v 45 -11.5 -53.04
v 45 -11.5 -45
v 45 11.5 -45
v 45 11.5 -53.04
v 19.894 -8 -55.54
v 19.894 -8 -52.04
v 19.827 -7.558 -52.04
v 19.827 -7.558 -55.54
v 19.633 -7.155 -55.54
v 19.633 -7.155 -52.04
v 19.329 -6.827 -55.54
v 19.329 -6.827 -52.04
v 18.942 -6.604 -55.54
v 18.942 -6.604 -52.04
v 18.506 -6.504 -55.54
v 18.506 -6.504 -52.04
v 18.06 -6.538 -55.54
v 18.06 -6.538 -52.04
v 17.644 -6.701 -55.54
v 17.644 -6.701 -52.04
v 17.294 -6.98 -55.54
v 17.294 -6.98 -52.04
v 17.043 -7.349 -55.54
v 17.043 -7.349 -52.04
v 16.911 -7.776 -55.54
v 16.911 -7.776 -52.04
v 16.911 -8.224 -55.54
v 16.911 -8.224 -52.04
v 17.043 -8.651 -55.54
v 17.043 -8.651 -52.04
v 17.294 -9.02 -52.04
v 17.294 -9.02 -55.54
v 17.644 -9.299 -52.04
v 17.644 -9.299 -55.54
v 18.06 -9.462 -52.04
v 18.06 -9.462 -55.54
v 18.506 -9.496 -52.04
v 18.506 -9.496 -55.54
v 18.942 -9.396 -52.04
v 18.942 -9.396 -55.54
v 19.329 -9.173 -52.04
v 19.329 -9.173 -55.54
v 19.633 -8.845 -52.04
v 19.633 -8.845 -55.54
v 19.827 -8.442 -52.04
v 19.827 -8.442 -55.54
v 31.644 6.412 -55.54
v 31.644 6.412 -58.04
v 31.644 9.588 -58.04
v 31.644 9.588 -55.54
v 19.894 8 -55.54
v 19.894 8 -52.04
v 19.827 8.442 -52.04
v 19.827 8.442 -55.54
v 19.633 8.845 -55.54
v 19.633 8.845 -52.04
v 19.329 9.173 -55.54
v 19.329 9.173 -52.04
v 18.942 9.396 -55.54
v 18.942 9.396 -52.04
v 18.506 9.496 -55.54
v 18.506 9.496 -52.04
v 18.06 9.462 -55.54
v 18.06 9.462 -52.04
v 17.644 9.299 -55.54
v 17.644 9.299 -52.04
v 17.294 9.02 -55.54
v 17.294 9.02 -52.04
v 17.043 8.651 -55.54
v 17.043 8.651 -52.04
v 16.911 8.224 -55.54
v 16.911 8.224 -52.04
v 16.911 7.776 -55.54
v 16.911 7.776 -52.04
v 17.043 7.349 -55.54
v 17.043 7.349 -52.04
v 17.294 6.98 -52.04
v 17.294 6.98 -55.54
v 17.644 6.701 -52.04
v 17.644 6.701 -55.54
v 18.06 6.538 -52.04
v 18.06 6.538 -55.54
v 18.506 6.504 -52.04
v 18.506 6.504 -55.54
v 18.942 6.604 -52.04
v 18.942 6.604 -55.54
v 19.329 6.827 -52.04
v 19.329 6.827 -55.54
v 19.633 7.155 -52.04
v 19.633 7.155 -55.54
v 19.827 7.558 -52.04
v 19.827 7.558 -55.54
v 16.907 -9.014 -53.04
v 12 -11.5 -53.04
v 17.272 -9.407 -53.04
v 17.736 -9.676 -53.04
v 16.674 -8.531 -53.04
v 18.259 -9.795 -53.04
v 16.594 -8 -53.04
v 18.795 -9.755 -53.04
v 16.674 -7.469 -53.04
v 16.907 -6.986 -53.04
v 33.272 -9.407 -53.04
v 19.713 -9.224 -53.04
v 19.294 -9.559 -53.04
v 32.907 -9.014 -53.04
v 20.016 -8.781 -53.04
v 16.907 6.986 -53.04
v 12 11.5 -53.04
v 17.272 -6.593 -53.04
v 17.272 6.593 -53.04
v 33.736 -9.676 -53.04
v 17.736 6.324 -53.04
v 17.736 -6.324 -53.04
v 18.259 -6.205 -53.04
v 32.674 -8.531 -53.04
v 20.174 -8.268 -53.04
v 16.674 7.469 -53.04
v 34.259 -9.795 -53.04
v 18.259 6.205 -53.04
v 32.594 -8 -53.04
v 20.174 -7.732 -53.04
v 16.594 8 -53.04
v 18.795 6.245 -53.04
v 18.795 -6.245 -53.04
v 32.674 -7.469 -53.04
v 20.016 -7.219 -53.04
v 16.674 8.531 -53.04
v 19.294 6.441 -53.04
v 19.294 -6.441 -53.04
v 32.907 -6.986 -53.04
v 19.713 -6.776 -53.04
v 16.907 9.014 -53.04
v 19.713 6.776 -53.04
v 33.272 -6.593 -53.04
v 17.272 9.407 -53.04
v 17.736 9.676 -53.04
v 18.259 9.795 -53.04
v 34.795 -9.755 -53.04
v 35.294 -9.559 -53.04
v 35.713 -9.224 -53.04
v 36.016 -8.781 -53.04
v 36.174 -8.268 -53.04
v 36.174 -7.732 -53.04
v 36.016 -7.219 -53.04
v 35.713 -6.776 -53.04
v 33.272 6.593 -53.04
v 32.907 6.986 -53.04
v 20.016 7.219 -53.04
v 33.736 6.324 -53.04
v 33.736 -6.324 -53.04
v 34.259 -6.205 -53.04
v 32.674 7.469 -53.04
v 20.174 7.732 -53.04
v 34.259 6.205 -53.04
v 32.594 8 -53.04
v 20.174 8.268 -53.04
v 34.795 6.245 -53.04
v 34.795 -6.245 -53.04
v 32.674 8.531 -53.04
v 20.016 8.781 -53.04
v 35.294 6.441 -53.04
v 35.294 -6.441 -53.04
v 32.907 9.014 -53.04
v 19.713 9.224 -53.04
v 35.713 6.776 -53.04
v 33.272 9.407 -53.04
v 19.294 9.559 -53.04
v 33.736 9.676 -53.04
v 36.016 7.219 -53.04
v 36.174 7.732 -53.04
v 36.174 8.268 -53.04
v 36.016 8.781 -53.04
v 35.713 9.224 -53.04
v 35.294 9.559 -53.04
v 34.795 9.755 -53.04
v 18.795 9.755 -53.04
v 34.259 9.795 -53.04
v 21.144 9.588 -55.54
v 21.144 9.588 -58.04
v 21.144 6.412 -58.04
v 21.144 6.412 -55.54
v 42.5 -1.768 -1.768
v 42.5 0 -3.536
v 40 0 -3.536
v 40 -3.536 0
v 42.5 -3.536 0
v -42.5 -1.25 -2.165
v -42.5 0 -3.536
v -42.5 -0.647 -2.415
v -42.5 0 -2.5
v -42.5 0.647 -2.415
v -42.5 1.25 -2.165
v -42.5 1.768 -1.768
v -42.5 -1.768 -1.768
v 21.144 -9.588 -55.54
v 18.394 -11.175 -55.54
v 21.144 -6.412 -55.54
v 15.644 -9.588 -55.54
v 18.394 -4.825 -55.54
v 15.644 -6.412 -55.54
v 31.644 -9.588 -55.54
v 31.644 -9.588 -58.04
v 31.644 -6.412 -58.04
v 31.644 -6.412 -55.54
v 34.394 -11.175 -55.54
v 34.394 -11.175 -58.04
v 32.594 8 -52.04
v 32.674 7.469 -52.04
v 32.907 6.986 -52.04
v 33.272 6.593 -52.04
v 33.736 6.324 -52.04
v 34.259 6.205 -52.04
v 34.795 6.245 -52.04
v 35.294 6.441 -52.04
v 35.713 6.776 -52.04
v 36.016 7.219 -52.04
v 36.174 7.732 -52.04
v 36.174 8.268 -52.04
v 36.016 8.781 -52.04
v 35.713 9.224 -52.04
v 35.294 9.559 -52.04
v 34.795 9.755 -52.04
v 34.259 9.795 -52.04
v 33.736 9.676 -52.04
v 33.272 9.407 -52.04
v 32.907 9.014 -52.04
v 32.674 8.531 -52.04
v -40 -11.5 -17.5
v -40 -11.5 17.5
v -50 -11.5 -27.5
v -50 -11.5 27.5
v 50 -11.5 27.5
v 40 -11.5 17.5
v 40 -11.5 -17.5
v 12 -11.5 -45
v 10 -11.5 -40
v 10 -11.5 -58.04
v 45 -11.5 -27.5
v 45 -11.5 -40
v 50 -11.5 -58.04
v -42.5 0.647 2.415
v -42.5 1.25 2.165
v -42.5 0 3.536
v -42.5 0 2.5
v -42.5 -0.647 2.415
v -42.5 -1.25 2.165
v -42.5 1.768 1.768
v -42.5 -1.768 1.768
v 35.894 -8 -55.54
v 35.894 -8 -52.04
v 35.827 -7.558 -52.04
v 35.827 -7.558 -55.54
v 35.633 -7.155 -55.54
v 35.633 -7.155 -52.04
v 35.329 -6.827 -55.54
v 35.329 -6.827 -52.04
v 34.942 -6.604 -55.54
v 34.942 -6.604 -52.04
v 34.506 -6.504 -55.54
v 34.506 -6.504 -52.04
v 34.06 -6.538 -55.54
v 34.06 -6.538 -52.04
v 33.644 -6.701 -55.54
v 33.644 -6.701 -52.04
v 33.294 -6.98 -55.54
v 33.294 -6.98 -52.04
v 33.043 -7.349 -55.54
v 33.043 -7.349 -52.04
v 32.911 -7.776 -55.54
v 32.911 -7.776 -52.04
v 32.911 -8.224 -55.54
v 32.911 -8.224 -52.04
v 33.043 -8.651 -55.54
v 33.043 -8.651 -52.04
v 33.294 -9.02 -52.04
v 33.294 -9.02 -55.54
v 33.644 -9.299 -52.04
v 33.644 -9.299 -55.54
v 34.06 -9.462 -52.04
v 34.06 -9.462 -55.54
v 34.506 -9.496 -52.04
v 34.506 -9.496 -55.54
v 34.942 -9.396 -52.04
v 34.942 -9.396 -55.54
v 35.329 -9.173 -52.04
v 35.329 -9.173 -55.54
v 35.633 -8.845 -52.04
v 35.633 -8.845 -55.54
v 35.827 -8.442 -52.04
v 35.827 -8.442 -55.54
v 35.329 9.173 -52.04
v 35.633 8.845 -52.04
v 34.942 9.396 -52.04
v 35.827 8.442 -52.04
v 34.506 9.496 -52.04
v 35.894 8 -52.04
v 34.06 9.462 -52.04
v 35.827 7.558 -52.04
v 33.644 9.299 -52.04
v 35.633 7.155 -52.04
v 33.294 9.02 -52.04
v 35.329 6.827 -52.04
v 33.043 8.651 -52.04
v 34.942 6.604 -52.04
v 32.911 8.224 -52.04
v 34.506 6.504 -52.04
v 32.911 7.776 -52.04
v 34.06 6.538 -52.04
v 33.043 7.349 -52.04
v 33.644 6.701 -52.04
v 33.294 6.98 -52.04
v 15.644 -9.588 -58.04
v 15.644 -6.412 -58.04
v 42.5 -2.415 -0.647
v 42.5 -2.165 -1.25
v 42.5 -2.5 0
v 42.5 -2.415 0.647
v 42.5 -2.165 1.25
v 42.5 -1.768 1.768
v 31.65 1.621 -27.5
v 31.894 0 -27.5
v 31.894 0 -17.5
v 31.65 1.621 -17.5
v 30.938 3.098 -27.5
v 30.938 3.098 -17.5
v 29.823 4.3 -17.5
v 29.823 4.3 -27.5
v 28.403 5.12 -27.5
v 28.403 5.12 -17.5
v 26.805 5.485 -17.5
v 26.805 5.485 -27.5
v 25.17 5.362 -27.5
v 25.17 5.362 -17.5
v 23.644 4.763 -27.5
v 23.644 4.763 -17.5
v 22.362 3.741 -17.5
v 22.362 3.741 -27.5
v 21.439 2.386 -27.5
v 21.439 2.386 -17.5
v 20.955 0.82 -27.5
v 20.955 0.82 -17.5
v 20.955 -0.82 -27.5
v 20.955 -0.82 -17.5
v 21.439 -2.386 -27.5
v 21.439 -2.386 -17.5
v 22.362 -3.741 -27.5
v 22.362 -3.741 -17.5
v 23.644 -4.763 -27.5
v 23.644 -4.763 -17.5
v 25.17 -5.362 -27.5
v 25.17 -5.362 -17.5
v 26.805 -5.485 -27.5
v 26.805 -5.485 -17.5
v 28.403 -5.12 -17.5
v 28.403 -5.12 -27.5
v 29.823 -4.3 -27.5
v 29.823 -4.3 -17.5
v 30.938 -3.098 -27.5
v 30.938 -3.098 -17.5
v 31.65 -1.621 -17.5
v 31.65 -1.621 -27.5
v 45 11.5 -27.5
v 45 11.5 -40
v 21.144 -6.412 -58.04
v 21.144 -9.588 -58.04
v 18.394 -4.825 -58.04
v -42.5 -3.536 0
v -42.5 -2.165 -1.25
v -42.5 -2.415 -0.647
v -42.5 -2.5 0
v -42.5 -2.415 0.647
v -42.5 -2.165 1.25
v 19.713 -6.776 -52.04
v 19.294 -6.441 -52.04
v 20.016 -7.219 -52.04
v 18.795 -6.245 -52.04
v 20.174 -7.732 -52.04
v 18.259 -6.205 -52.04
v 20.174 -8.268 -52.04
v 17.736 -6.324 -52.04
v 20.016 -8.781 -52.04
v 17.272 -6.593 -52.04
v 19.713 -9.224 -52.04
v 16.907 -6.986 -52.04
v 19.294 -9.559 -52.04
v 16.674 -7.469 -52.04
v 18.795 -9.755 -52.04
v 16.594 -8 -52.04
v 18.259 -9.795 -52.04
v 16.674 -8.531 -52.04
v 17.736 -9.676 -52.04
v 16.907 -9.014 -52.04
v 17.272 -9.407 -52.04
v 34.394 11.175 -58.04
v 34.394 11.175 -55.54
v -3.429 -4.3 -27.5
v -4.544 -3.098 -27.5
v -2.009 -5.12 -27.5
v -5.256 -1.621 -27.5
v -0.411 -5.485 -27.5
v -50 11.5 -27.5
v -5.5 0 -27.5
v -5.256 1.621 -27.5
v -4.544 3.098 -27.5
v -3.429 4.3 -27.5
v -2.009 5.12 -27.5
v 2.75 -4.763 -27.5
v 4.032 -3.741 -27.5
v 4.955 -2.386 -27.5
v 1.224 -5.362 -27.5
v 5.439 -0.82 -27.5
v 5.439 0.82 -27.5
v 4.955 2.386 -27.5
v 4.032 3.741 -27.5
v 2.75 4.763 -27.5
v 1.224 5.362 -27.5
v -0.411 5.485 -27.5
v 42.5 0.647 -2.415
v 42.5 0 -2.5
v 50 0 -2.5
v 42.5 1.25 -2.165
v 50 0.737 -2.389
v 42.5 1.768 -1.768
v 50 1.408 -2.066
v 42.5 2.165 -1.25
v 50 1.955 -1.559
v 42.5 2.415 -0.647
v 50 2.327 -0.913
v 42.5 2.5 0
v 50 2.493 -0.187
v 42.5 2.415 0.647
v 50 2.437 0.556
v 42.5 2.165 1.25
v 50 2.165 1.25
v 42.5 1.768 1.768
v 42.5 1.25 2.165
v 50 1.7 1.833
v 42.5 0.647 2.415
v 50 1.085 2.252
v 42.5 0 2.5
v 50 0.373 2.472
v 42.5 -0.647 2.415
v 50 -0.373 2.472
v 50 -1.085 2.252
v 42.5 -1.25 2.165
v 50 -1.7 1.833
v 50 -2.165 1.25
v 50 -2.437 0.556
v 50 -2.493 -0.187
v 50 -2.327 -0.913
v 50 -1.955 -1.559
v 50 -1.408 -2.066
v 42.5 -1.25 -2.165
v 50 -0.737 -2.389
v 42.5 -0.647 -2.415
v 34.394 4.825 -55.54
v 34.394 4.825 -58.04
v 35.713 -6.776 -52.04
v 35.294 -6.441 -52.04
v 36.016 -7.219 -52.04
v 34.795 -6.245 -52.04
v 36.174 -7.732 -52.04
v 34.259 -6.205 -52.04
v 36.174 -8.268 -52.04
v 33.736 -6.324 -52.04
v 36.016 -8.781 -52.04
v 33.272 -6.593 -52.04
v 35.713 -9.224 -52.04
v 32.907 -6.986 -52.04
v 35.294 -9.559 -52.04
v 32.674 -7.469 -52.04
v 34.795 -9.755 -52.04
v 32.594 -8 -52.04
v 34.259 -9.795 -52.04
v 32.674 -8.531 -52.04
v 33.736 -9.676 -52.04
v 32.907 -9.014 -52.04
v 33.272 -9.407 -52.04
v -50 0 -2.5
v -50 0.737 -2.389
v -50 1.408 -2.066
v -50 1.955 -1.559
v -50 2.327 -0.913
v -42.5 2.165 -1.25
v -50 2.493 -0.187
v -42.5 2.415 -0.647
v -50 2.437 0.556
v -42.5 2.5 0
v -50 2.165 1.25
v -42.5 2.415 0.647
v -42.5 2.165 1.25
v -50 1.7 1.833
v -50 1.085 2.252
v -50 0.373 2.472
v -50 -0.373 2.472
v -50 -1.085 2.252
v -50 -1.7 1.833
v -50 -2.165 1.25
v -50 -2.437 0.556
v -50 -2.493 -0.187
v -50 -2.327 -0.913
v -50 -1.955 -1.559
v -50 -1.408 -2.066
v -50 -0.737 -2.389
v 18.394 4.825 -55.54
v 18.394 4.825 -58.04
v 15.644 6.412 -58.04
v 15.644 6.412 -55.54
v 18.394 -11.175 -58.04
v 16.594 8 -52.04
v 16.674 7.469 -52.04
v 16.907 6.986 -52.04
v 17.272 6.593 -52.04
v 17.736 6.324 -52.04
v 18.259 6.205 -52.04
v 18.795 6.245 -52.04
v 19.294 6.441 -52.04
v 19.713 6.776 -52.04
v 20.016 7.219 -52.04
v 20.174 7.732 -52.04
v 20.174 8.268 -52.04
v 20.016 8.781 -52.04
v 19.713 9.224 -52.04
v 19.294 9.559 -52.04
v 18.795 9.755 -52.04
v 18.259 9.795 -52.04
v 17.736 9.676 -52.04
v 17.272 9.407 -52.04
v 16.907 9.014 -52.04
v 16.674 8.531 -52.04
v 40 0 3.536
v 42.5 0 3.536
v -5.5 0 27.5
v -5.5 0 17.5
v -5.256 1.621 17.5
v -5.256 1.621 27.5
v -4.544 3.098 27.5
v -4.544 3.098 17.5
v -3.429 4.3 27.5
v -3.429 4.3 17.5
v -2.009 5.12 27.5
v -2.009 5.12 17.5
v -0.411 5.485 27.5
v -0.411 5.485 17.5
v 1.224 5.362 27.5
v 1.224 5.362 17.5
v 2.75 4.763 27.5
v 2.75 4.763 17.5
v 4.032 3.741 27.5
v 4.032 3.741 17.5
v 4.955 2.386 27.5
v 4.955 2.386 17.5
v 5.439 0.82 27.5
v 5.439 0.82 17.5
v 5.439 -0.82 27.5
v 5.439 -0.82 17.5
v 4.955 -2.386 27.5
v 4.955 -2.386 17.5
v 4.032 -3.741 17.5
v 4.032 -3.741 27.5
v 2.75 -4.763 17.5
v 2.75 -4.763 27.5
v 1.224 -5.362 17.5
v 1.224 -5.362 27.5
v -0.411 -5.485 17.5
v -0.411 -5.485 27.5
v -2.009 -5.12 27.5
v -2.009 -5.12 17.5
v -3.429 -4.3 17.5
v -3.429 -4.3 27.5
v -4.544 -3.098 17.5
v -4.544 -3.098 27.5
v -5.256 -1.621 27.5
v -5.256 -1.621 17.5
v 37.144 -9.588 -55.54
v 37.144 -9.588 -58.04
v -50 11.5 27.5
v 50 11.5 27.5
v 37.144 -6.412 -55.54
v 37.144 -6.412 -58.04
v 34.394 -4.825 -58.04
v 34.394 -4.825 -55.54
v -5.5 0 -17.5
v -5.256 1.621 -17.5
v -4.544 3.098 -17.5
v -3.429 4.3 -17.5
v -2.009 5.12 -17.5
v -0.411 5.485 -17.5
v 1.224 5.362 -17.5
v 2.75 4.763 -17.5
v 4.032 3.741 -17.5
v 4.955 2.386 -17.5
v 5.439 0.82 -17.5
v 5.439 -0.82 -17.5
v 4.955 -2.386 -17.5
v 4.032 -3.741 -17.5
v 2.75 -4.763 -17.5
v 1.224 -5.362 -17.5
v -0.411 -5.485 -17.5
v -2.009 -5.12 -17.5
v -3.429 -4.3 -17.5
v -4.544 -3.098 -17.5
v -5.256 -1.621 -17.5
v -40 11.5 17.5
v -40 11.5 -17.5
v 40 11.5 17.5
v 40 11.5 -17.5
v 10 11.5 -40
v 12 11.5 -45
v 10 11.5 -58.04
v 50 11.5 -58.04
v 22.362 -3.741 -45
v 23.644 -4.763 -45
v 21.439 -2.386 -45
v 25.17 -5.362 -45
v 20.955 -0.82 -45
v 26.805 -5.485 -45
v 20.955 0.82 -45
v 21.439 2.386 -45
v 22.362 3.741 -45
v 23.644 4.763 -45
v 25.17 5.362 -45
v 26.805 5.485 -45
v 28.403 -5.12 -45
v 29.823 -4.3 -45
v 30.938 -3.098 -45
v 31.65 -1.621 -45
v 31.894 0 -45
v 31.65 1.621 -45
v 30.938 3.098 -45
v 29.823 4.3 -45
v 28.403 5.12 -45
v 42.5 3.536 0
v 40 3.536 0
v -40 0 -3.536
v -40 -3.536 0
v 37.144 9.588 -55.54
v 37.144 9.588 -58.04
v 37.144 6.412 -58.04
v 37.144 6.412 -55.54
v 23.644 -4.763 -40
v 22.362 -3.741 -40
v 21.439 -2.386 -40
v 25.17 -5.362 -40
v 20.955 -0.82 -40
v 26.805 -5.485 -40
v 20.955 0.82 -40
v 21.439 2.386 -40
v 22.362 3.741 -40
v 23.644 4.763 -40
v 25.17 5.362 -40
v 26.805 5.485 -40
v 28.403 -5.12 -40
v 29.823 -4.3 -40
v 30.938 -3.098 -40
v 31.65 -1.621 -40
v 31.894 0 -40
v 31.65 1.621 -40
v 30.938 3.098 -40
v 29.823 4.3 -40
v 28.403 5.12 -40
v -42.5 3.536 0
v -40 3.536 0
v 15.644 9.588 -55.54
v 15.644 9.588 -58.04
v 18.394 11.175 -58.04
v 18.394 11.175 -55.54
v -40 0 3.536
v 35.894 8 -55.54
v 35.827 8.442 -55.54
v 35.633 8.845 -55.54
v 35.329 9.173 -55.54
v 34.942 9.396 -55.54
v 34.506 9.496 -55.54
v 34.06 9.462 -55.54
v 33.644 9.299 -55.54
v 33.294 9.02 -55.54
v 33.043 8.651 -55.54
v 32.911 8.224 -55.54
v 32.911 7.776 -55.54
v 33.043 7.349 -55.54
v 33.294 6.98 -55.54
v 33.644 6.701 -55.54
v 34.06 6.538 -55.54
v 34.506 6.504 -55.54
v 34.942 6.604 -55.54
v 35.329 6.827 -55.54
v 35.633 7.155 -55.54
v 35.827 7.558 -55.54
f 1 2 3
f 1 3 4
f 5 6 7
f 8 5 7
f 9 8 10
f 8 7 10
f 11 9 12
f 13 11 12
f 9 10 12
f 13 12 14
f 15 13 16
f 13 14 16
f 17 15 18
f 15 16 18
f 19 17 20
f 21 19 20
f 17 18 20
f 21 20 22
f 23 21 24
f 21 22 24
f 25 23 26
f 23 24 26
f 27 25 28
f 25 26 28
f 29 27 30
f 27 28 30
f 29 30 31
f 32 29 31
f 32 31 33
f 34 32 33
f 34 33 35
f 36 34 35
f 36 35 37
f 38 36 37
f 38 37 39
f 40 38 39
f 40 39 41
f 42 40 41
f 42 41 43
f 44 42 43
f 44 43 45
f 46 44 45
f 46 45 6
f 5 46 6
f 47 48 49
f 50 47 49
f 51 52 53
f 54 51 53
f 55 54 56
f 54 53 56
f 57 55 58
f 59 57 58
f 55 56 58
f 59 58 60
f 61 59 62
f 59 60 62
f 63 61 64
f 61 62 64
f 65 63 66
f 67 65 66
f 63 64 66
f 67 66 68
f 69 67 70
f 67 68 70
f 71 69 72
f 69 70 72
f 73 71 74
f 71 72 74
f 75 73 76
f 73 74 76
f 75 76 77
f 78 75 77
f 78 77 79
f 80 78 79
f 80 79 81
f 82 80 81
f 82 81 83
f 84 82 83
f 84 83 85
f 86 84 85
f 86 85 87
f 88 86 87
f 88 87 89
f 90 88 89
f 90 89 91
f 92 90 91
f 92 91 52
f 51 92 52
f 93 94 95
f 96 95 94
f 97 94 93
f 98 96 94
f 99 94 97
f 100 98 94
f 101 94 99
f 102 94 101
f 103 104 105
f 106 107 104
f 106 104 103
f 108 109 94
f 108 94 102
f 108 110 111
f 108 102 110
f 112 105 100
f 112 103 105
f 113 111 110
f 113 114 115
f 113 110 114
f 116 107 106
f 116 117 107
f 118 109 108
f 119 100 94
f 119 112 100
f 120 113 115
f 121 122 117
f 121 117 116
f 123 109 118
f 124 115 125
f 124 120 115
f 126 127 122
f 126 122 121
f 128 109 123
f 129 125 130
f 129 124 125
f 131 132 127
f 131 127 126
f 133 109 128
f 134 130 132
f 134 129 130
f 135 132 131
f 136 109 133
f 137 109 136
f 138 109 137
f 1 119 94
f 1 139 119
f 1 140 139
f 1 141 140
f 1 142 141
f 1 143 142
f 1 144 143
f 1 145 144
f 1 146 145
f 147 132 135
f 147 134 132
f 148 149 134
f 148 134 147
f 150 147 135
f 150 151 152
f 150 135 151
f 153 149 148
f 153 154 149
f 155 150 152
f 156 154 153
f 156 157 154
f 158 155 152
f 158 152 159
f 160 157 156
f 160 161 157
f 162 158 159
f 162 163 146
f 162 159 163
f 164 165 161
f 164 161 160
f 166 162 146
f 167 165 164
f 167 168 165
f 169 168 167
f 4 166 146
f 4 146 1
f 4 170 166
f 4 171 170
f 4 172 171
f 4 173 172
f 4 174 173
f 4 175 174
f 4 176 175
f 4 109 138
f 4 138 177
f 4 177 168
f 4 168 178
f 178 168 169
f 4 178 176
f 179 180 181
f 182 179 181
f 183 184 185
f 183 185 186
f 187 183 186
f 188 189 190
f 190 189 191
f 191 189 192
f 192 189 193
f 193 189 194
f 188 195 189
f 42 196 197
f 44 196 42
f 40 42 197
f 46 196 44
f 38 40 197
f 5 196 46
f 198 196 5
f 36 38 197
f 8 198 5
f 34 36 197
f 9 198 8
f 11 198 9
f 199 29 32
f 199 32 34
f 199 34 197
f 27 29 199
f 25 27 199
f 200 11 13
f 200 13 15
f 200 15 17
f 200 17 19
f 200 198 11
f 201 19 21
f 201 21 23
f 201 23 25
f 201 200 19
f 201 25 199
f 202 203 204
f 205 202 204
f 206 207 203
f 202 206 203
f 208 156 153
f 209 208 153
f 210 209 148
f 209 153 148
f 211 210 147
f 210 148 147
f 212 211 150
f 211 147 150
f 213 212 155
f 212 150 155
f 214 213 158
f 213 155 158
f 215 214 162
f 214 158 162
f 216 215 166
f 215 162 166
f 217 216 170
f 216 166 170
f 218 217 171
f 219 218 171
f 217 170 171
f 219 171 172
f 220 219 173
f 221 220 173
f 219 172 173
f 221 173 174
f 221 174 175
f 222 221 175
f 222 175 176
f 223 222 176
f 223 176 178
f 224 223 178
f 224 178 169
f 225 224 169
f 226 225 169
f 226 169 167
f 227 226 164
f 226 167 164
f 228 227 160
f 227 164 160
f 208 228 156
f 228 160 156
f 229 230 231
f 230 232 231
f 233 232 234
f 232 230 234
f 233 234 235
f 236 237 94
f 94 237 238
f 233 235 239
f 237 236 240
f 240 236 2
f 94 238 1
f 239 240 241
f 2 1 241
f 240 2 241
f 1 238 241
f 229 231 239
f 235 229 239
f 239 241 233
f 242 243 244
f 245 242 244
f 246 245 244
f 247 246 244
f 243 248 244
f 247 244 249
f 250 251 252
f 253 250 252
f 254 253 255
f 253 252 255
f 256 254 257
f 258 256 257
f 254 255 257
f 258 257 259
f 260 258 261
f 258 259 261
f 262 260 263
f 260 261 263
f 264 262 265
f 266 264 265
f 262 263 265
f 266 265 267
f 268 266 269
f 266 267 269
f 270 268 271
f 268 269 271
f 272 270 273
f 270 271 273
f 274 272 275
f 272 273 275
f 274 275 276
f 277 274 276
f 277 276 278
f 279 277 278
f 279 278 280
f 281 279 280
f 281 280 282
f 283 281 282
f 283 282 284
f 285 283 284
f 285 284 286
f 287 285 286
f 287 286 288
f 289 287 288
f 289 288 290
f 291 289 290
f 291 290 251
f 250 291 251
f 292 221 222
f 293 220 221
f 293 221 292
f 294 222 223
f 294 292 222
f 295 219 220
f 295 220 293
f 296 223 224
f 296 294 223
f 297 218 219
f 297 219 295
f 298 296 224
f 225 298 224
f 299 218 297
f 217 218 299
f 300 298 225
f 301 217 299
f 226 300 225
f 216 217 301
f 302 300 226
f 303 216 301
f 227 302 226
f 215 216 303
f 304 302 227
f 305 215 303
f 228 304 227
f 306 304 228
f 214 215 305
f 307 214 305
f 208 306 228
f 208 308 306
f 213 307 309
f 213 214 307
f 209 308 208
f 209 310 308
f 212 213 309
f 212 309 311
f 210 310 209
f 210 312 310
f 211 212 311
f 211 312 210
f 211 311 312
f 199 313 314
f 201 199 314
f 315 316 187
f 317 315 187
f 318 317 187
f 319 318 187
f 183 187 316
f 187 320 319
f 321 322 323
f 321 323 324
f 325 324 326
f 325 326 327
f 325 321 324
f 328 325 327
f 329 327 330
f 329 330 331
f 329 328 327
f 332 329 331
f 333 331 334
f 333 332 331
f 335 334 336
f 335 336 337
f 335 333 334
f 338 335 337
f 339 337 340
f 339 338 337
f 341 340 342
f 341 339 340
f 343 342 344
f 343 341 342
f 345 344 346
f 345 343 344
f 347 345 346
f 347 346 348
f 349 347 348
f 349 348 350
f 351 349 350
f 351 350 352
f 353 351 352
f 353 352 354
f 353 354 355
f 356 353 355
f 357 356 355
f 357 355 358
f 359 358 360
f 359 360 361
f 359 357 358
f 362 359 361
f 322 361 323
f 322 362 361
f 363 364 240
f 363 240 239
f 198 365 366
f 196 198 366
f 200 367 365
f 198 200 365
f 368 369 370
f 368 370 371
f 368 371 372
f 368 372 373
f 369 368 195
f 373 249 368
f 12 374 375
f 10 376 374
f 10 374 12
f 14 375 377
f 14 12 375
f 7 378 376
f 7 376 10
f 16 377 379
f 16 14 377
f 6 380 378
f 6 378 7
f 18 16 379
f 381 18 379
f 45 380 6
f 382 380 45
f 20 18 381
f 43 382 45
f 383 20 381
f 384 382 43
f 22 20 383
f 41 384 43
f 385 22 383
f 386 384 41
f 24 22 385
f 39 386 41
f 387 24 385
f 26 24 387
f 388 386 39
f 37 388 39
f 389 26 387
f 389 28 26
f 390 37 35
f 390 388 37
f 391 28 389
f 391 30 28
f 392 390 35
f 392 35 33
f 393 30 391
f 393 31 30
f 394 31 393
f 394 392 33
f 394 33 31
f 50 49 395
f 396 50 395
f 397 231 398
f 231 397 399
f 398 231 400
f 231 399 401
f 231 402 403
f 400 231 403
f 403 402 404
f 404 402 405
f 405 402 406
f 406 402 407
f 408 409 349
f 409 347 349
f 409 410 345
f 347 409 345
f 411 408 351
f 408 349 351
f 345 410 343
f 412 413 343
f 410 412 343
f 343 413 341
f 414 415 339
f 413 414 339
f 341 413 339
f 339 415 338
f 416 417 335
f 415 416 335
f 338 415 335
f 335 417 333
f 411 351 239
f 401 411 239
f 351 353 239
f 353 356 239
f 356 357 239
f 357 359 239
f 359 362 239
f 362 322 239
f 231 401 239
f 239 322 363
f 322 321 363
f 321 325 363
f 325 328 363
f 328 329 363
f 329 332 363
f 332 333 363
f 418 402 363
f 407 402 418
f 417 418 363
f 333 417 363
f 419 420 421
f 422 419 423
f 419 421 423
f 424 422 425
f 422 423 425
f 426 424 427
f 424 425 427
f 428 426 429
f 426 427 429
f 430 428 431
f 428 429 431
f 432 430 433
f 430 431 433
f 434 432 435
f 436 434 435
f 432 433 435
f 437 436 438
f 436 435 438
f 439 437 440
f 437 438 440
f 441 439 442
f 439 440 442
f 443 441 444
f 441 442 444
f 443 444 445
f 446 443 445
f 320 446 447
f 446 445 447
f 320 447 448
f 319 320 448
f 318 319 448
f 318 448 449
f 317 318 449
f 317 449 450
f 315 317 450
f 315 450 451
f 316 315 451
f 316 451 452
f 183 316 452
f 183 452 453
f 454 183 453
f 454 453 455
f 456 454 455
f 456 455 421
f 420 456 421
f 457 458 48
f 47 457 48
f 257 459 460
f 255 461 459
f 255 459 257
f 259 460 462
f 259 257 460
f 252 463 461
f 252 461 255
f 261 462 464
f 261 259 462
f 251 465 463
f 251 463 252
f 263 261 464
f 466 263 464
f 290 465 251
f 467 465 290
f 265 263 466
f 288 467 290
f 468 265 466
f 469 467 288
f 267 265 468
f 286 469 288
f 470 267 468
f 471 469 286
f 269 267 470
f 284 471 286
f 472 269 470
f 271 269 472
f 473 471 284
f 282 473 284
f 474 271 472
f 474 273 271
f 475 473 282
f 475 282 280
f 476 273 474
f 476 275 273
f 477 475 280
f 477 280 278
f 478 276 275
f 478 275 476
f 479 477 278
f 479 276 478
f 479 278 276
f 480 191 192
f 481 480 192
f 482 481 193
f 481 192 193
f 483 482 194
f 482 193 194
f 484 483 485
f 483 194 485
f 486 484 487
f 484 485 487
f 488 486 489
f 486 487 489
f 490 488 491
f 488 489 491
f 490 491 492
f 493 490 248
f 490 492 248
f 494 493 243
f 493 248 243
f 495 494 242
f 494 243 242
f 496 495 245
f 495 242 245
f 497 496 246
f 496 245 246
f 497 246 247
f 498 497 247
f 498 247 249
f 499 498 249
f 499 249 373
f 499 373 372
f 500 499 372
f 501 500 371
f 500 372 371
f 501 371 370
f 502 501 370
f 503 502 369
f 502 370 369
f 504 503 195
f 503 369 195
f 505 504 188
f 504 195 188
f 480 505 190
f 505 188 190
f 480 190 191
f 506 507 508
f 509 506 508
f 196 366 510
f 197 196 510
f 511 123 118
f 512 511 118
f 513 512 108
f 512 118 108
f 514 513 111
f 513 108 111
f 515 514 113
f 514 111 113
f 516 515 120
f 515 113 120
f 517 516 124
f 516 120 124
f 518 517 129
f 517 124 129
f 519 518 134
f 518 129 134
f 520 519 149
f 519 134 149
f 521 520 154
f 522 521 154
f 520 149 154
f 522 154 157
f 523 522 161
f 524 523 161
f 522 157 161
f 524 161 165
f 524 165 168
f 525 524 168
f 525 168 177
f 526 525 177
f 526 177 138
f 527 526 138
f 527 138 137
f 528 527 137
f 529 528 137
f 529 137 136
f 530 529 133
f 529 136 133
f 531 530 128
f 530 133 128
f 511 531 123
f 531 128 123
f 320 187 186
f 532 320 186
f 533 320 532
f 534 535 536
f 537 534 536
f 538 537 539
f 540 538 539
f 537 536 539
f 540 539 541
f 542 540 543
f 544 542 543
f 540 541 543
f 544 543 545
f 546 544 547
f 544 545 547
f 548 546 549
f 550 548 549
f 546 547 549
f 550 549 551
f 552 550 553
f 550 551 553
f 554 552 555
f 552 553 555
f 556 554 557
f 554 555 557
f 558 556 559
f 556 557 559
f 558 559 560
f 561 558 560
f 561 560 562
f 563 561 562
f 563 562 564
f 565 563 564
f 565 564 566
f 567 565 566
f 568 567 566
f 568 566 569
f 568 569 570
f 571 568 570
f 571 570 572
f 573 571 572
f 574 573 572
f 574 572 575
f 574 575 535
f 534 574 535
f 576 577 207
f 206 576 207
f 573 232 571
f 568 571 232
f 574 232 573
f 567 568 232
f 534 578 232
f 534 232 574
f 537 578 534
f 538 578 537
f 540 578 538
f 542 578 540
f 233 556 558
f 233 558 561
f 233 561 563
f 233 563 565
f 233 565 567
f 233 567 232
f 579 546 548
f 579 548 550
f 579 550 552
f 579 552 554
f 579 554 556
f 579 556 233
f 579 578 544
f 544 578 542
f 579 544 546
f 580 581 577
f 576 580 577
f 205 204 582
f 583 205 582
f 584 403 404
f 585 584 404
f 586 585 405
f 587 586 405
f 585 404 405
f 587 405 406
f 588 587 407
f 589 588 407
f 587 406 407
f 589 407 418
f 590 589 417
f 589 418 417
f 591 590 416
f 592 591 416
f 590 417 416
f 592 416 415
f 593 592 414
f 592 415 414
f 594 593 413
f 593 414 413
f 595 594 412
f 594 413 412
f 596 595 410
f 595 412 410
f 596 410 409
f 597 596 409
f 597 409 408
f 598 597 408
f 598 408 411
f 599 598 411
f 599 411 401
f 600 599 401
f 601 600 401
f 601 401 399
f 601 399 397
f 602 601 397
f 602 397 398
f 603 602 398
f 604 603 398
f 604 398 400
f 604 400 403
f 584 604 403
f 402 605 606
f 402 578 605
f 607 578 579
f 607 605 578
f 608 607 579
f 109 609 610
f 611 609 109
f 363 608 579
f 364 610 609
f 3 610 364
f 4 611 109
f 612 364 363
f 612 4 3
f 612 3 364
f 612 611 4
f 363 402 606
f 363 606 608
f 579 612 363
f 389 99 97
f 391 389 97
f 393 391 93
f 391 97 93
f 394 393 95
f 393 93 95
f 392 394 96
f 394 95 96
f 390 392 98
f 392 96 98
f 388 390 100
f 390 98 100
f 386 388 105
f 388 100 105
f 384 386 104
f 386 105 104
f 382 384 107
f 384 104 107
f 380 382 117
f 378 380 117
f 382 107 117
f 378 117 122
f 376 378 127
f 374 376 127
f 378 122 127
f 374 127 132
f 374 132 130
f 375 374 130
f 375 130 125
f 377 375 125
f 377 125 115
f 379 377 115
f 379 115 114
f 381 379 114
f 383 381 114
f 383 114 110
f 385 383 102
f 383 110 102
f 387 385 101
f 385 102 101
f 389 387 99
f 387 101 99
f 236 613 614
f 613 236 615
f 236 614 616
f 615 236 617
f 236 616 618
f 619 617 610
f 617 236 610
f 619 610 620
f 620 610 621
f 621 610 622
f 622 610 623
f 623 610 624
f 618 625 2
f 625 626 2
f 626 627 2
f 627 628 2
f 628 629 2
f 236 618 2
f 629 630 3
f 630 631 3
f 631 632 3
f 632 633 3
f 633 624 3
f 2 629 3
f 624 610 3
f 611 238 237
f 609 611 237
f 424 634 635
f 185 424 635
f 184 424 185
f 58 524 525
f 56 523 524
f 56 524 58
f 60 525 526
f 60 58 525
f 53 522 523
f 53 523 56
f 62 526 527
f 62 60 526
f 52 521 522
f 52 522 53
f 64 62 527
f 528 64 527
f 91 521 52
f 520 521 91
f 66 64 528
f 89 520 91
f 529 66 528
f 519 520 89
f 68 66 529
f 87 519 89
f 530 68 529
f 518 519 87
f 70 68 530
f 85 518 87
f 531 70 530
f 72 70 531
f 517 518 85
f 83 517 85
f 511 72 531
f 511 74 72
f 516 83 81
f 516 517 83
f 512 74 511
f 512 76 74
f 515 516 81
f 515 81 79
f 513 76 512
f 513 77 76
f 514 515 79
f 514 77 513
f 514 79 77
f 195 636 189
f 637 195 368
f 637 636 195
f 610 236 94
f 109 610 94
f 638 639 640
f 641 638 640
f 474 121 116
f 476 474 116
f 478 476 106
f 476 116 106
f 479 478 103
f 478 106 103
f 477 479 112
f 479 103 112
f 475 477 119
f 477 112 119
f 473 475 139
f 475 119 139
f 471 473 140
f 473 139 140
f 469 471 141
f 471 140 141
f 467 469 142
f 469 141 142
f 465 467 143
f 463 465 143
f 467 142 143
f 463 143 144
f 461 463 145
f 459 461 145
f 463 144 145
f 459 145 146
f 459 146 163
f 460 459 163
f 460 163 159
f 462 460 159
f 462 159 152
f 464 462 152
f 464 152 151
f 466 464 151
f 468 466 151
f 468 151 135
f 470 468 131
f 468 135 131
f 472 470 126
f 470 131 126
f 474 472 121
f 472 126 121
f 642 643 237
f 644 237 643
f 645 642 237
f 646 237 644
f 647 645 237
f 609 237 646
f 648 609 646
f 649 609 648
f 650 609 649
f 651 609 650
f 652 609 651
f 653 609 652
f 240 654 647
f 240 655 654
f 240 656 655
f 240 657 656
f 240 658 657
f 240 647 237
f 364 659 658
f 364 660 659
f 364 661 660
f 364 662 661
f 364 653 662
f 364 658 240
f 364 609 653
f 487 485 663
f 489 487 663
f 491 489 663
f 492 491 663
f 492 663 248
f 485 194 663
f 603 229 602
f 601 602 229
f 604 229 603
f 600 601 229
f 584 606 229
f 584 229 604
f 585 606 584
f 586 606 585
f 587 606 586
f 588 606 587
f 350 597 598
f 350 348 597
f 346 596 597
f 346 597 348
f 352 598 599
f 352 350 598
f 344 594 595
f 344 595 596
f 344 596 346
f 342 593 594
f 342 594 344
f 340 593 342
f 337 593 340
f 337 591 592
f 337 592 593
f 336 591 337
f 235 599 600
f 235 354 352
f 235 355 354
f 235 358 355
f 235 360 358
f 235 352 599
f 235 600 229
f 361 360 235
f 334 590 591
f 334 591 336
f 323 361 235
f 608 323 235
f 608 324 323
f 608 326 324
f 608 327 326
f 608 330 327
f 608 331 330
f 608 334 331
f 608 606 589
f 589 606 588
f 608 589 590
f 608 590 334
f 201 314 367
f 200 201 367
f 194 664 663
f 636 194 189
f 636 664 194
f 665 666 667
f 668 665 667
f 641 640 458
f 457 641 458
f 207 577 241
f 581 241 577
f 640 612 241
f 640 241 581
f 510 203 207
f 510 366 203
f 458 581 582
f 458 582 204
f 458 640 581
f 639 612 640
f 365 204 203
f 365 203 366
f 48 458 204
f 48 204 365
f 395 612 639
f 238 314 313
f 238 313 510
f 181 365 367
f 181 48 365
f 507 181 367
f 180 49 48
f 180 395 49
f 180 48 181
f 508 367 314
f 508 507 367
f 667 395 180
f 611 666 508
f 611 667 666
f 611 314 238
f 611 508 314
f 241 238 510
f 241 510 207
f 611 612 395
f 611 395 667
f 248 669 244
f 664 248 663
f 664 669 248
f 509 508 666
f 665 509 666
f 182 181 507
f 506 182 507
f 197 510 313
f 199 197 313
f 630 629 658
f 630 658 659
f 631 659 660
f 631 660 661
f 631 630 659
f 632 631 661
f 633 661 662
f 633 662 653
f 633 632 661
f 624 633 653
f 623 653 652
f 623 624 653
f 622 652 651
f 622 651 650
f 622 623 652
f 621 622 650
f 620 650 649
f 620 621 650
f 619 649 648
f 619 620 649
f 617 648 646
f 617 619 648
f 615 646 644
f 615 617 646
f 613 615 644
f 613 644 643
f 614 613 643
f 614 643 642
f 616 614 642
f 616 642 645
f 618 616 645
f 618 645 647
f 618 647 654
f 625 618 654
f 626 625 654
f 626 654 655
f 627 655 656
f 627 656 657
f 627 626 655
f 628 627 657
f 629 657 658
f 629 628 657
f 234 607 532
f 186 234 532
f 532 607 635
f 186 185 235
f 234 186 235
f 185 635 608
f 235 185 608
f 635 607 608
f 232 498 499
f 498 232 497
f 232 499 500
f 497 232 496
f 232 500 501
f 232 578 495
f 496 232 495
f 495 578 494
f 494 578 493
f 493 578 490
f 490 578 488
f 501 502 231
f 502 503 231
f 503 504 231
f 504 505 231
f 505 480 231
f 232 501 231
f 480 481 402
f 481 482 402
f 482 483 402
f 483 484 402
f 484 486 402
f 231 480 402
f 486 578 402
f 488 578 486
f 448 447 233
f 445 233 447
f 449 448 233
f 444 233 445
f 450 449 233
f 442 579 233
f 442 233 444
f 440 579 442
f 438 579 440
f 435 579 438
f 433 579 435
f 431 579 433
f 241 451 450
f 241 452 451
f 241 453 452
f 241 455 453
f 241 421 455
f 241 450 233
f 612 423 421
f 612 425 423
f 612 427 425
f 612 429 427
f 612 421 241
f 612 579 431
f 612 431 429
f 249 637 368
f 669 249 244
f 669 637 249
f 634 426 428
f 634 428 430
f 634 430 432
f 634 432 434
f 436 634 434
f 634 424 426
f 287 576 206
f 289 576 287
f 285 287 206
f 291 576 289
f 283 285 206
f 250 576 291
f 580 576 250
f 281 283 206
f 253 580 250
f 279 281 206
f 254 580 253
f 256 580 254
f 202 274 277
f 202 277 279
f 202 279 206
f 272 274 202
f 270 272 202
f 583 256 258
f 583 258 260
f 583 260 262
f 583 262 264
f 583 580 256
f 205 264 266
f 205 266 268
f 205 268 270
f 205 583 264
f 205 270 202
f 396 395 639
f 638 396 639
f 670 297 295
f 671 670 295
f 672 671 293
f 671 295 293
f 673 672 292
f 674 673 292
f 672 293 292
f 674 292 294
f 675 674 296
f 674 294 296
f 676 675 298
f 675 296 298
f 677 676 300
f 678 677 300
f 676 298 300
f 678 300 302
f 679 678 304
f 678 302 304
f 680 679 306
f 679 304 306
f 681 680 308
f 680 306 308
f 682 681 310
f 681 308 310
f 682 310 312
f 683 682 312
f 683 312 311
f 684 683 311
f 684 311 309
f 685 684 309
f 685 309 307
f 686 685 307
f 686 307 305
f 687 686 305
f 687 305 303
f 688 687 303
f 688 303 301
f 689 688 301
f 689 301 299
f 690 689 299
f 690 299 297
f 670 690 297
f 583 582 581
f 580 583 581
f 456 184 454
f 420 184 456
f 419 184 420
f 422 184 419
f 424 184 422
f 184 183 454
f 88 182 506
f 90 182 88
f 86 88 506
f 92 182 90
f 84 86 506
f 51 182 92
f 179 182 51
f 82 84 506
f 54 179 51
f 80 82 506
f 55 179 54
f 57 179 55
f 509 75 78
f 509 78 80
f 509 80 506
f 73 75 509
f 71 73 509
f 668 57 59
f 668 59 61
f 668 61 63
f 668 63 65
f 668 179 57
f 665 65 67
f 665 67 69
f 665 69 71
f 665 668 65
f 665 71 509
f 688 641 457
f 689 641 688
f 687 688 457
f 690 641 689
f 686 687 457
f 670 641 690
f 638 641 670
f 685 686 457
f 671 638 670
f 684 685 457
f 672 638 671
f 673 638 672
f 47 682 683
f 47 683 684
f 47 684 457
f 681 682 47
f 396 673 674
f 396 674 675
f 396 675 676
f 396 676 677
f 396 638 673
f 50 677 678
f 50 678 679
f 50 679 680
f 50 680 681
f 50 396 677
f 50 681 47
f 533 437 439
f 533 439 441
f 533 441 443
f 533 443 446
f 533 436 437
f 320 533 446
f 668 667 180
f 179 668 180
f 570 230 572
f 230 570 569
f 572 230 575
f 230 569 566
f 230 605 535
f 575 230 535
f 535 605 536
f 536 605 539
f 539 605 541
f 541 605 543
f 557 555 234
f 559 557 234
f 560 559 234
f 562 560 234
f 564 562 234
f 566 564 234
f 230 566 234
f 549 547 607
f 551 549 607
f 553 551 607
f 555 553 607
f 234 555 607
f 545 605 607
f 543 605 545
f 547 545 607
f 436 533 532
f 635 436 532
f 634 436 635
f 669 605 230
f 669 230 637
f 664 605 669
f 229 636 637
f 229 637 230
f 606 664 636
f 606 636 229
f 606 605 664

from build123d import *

# Parameters (mm, degrees)
SKETCH1_W           = 100
SKETCH1_H           = 55
SKETCH1_W_2         = 80
SKETCH1_H_2         = 35
BOSS_EXTRUDE1_DEPTH = 11.5
CUT_EXTRUDE1_REACH  = 106.348
SKETCH2_R           = 2.5
CUT_EXTRUDE2_REACH  = 77.215
SKETCH3_R           = 5.5
CUT_EXTRUDE3_START  = -2.5
CUT_EXTRUDE3_DEPTH  = 85
SKETCH5_R           = 5.5
CUT_EXTRUDE4_DEPTH  = 10
SKETCH6_W           = 33
SKETCH6_H           = 8.04
BOSS_EXTRUDE2_DEPTH = 11.5
SKETCH8_R           = 1.8
BOSS_EXTRUDE3_DEPTH = 1
CUT_EXTRUDE5_REACH  = 96.651
SKETCH9_R           = 1.5
CUT_EXTRUDE6_DEPTH  = 2.5
CUT_EXTRUDE7_START  = -5
SKETCH11_R          = 5.5
CUT_EXTRUDE7_DEPTH  = 5


with BuildPart() as part:
    # Sketch1 → Boss-Extrude1 (new, symmetric)
    with BuildSketch(Plane(origin=(0, 0, 0), x_dir=(1, 0, 0), z_dir=(0, 1, 0))):
        Rectangle(SKETCH1_W, SKETCH1_H)
        Rectangle(SKETCH1_W_2, SKETCH1_H_2, mode=Mode.SUBTRACT)
    extrude(amount=BOSS_EXTRUDE1_DEPTH, both=True)

    # Cut-Extrude1: up to this face of the body (flat: up to its plane)
    cut_extrude1_end = Plane(part.part.faces().sort_by_distance((-50, 0, 0))[0])
    # Sketch2 → Cut-Extrude1 (cut, up to the picked face)
    with BuildSketch(Plane(origin=(50, 0, 0), x_dir=(0, 0, -1), z_dir=(1, 0, 0)), mode=Mode.PRIVATE) as cut_extrude1_sk1:
        Circle(SKETCH2_R)
    cut_extrude1_tool1 = split(extrude(cut_extrude1_sk1.sketch, amount=-CUT_EXTRUDE1_REACH, mode=Mode.PRIVATE), bisect_by=cut_extrude1_end, keep=Keep.BOTH, mode=Mode.PRIVATE)
    add(cut_extrude1_tool1.solids().sort_by(Axis((50, 0, 0), (-1, 0, 0)))[0], mode=Mode.SUBTRACT)

    # Cut-Extrude2: up to this face of the body (flat: up to its plane)
    cut_extrude2_end = Plane(part.part.faces().sort_by_distance((0, 0, 27.5))[0])
    # Sketch3 → Cut-Extrude2 (cut, up to the picked face)
    with BuildSketch(Plane(origin=(0, 0, -27.5), x_dir=(-1, 0, 0), z_dir=(0, 0, -1)), mode=Mode.PRIVATE) as cut_extrude2_sk1:
        Circle(SKETCH3_R)
    cut_extrude2_tool1 = split(extrude(cut_extrude2_sk1.sketch, amount=-CUT_EXTRUDE2_REACH, mode=Mode.PRIVATE), bisect_by=cut_extrude2_end, keep=Keep.BOTH, mode=Mode.PRIVATE)
    add(cut_extrude2_tool1.solids().sort_by(Axis((0, 0, -27.5), (0, 0, 1)))[0], mode=Mode.SUBTRACT)

    # Sketch4 → Cut-Extrude3 (cut)
    with BuildSketch(Plane.ZY.offset(-40).offset(CUT_EXTRUDE3_START)):
        with BuildLine():
            ThreePointArc((1.767766953, -1.767766953), (2e-09, -2.5), (-1.767766951, -1.767766955))
            Line((-1.767766951, -1.767766955), (0, -3.535533906))
            Line((0, -3.535533906), (1.767766953, -1.767766953))
        make_face()
        with BuildLine():
            ThreePointArc((-1.767766951, -1.767766955), (-2.5, -2e-09), (-1.767766953, 1.767766953))
            Line((-1.767766953, 1.767766953), (-3.535533906, 0))
            Line((-3.535533906, 0), (-1.767766951, -1.767766955))
        make_face()
        with BuildLine():
            Line((1.767766953, 1.767766953), (0, 3.535533906))
            Line((0, 3.535533906), (-1.767766953, 1.767766953))
            ThreePointArc((-1.767766953, 1.767766953), (0, 2.5), (1.767766953, 1.767766953))
        make_face()
        with BuildLine():
            Line((3.535533906, 0), (1.767766953, 1.767766953))
            ThreePointArc((1.767766953, 1.767766953), (2.309698831, 0.956708581), (2.5, 0))
            ThreePointArc((2.5, 0), (2.309698831, -0.956708581), (1.767766953, -1.767766953))
            Line((1.767766953, -1.767766953), (3.535533906, 0))
        make_face()
    extrude(amount=CUT_EXTRUDE3_DEPTH, mode=Mode.SUBTRACT)

    # Sketch5 → Cut-Extrude4 (cut)
    with BuildSketch(Plane.XY.offset(-27.5)):
        with Locations((26.394, 0)):
            Circle(SKETCH5_R)
    extrude(amount=CUT_EXTRUDE4_DEPTH, mode=Mode.SUBTRACT)

    # Sketch6 → Boss-Extrude2 (add, symmetric)
    with BuildSketch(Plane(origin=(0, 0, 0), x_dir=(1, 0, 0), z_dir=(0, 1, 0))):
        Polygon((10, 58.04), (10, 40), (45, 40), (45, 27.5), (50, 27.5), (50, 58.04), align=None)
        with Locations((28.5, 49.02)):
            Rectangle(SKETCH6_W, SKETCH6_H, mode=Mode.SUBTRACT)
    extrude(amount=BOSS_EXTRUDE2_DEPTH, both=True)

    # Sketch8 → Boss-Extrude3 (add)
    with BuildSketch(Plane.XY.offset(-53.04)):
        with Locations(Location((18.394, 8, 0), (0, 0, 180))):
            Circle(SKETCH8_R)
        with Locations(Location((34.394, 8, 0), (0, 0, 180))):
            Circle(SKETCH8_R)
        with Locations(Location((34.394, -8, 0), (0, 0, 180))):
            Circle(SKETCH8_R)
        with Locations(Location((18.394, -8, 0), (0, 0, 180))):
            Circle(SKETCH8_R)
    extrude(amount=BOSS_EXTRUDE3_DEPTH)

    # Sketch9 → Cut-Extrude5 (cut, up to next)
    with BuildSketch(Plane.XY.offset(-52.04), mode=Mode.PRIVATE) as cut_extrude5_sk1:
        with Locations((18.394, 8)):
            Circle(SKETCH9_R)
    cut_extrude5_tool1 = extrude(cut_extrude5_sk1.sketch, amount=-CUT_EXTRUDE5_REACH, mode=Mode.PRIVATE) & part.part
    # Sketch9 → Cut-Extrude5 (cut, up to next)
    with BuildSketch(Plane.XY.offset(-52.04), mode=Mode.PRIVATE) as cut_extrude5_sk2:
        with Locations((34.394, 8)):
            Circle(SKETCH9_R)
    cut_extrude5_tool2 = extrude(cut_extrude5_sk2.sketch, amount=-CUT_EXTRUDE5_REACH, mode=Mode.PRIVATE) & part.part
    # Sketch9 → Cut-Extrude5 (cut, up to next)
    with BuildSketch(Plane.XY.offset(-52.04), mode=Mode.PRIVATE) as cut_extrude5_sk3:
        with Locations((34.394, -8)):
            Circle(SKETCH9_R)
    cut_extrude5_tool3 = extrude(cut_extrude5_sk3.sketch, amount=-CUT_EXTRUDE5_REACH, mode=Mode.PRIVATE) & part.part
    # Sketch9 → Cut-Extrude5 (cut, up to next)
    with BuildSketch(Plane.XY.offset(-52.04), mode=Mode.PRIVATE) as cut_extrude5_sk4:
        with Locations((18.394, -8)):
            Circle(SKETCH9_R)
    cut_extrude5_tool4 = extrude(cut_extrude5_sk4.sketch, amount=-CUT_EXTRUDE5_REACH, mode=Mode.PRIVATE) & part.part
    add(cut_extrude5_tool1.solids().sort_by_distance((18.394, 8, -52.04))[0], mode=Mode.SUBTRACT)
    add(cut_extrude5_tool2.solids().sort_by_distance((34.394, 8, -52.04))[0], mode=Mode.SUBTRACT)
    add(cut_extrude5_tool3.solids().sort_by_distance((34.394, -8, -52.04))[0], mode=Mode.SUBTRACT)
    add(cut_extrude5_tool4.solids().sort_by_distance((18.394, -8, -52.04))[0], mode=Mode.SUBTRACT)

    # Sketch10 → Cut-Extrude6 (cut)
    with BuildSketch(Plane(origin=(0, 0, -58.04), x_dir=(-1, 0, 0), z_dir=(0, 0, -1))):
        Polygon((-31.644, 6.41228676), (-31.644, 9.58771324), (-34.394, 11.175426481), (-37.144, 9.58771324), (-37.144, 6.41228676), (-34.394, 4.824573519), align=None)
        Polygon((-15.644, 6.41228676), (-15.644, 9.58771324), (-18.394, 11.175426481), (-21.144, 9.58771324), (-21.144, 6.41228676), (-18.394, 4.824573519), align=None)
        Polygon((-15.644, -9.58771324), (-15.644, -6.41228676), (-18.394, -4.824573519), (-21.144, -6.41228676), (-21.144, -9.58771324), (-18.394, -11.175426481), align=None)
        Polygon((-31.644, -9.58771324), (-31.644, -6.41228676), (-34.394, -4.824573519), (-37.144, -6.41228676), (-37.144, -9.58771324), (-34.394, -11.175426481), align=None)
    extrude(amount=-CUT_EXTRUDE6_DEPTH, mode=Mode.SUBTRACT)

    # Sketch11 → Cut-Extrude7 (cut)
    with BuildSketch(Plane.XY.offset(-40).offset(CUT_EXTRUDE7_START)):
        with Locations((26.394, 0)):
            Circle(SKETCH11_R)
    extrude(amount=CUT_EXTRUDE7_DEPTH, mode=Mode.SUBTRACT)


solid = part.part
